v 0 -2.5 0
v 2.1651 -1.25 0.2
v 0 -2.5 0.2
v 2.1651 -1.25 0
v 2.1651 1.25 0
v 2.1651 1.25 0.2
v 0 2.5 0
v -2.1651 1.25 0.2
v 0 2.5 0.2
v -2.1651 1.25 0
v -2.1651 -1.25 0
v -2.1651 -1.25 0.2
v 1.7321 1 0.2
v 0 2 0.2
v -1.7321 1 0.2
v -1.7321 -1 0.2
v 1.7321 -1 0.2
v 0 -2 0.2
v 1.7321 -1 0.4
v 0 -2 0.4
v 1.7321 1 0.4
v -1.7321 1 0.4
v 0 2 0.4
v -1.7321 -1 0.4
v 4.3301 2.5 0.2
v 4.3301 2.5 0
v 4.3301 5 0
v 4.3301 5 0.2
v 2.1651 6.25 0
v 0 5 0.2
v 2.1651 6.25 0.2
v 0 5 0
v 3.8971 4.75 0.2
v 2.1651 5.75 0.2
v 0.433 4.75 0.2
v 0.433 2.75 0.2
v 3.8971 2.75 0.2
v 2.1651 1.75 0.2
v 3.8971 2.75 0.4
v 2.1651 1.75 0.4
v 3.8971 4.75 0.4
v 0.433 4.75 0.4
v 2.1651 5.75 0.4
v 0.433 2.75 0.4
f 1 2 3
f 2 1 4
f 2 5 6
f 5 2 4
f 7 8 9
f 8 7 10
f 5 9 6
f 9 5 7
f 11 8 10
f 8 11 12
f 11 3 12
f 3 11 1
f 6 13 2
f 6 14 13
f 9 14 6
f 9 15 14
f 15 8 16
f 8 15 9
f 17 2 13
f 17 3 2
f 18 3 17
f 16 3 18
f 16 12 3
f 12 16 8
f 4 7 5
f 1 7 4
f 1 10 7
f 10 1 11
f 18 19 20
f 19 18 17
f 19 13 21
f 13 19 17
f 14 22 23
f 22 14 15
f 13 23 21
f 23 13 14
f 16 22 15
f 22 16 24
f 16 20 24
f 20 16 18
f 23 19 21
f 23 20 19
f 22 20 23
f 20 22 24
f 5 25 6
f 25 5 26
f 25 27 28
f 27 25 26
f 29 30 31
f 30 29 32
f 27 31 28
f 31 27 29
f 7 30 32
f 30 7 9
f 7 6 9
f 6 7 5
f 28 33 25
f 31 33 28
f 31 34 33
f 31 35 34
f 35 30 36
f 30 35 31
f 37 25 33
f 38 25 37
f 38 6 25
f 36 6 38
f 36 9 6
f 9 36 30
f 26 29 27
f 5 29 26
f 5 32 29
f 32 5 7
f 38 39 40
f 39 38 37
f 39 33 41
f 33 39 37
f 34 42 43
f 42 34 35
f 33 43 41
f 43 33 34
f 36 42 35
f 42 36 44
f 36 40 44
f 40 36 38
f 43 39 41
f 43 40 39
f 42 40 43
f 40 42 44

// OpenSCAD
// file: parts.scad
/**
 * Martin Egli
 * 2024-05-15
 */

// origin: center
module rgbled2427(loc_res = 32) {
    color("White")
    difference() {
        translate([-2.7/2, -2.4/2, 0])
        cube([2.7, 2.4, 1.1]);
        translate([0, 0, 1.0])
        cylinder(d = 2, h = 0.5, $fn = loc_res);
        translate([0, 2, 1])
        rotate([0, 0, -45])
        cube([4, 4, 1]);
    }
}

// origin: center
module rgbled2427_cut(cut_hi = 2) {
    translate([-2.9/2, -2.4/2, -2])
    cube([2.9, 2.4, 2.5]);
    translate([-2.7/2, -2.4/2, 0])
    cube([2.7, 2.4, cut_hi]);
}
*rgbled2427();
*rgbled2427_cut();
// main file
/**
 * Martin Egli
 * 2024-05-15
 * testing honey comb structure to create the display
 * wall thickness: 0.5 mm
 * printing: 0.2 mm layer height
 */

use <parts.scad>

module hexagon_cover_element(hex_rad1 = 5/2, hex_hi1 = 0.2, hex_rad2 = 4/2, hex_hi2 = 0.4, hex_res = 6) {
    rotate([0, 0, 30]) {
        cylinder(r = hex_rad1, h = hex_hi1, $fn = hex_res);
        cylinder(r = hex_rad2, h = hex_hi2, $fn = hex_res);
    }
}

module hexagon_rest_element(hex_rad = 5/2, hex_hi = 4, wallth = 0.5, hex_res = 6) {
    rotate([0, 0, 30])
    difference() {
        cylinder(r = hex_rad + (wallth/2), h = hex_hi, $fn = hex_res);
        translate([0, 0, -1])
        cylinder(r = hex_rad - (wallth/2), h = hex_hi+2, $fn = hex_res);
    }
}

hex_rad = 5/2;
/* calculate hexagon center positions
 * r: radius, use "hex_rad"
 * n: index in x axis
 * m: index in y axis
 * even rows
 * dxeven = n*2*r*cos(30)
 * dyeven = m*3/2*r
 * odd rows
 * dxodd = (2n+1)*r*cos(30)
 * dyodd = (m)*3/2*r
 */
dx_even_factor = 2*hex_rad*cos(30); // see dxeven = n*2*r*cos(30)
dy_even_factor = 3/2*hex_rad; // see dyeven = m*3*r
dx_odd_factor = hex_rad*cos(30); // see dxodd = (2n+1)*r*cos(30)
dy_odd_factor = 3/2*hex_rad; // see dyodd = (m+1/2)*3*r
module disp_hexagon_cover_element(x_pos = 0, y_pos = 0) {
    if((y_pos % 2) == 0) {
        // even
        translate([x_pos*dx_even_factor, y_pos*dy_even_factor, 0])
        hexagon_cover_element();
    }
    else {
        translate([(2*x_pos+1)*dx_odd_factor, y_pos*dy_odd_factor, 0])
        hexagon_cover_element();
    }
}

disp_hexagon_cover_element(0, 0);
disp_hexagon_cover_element(0, 1);


/*

translate([0, 0, -1])
rotate([0, 0, 30])
cylinder(d = 4.75, h = 1.5, $fn = 6);

rgbled2427();
*/
